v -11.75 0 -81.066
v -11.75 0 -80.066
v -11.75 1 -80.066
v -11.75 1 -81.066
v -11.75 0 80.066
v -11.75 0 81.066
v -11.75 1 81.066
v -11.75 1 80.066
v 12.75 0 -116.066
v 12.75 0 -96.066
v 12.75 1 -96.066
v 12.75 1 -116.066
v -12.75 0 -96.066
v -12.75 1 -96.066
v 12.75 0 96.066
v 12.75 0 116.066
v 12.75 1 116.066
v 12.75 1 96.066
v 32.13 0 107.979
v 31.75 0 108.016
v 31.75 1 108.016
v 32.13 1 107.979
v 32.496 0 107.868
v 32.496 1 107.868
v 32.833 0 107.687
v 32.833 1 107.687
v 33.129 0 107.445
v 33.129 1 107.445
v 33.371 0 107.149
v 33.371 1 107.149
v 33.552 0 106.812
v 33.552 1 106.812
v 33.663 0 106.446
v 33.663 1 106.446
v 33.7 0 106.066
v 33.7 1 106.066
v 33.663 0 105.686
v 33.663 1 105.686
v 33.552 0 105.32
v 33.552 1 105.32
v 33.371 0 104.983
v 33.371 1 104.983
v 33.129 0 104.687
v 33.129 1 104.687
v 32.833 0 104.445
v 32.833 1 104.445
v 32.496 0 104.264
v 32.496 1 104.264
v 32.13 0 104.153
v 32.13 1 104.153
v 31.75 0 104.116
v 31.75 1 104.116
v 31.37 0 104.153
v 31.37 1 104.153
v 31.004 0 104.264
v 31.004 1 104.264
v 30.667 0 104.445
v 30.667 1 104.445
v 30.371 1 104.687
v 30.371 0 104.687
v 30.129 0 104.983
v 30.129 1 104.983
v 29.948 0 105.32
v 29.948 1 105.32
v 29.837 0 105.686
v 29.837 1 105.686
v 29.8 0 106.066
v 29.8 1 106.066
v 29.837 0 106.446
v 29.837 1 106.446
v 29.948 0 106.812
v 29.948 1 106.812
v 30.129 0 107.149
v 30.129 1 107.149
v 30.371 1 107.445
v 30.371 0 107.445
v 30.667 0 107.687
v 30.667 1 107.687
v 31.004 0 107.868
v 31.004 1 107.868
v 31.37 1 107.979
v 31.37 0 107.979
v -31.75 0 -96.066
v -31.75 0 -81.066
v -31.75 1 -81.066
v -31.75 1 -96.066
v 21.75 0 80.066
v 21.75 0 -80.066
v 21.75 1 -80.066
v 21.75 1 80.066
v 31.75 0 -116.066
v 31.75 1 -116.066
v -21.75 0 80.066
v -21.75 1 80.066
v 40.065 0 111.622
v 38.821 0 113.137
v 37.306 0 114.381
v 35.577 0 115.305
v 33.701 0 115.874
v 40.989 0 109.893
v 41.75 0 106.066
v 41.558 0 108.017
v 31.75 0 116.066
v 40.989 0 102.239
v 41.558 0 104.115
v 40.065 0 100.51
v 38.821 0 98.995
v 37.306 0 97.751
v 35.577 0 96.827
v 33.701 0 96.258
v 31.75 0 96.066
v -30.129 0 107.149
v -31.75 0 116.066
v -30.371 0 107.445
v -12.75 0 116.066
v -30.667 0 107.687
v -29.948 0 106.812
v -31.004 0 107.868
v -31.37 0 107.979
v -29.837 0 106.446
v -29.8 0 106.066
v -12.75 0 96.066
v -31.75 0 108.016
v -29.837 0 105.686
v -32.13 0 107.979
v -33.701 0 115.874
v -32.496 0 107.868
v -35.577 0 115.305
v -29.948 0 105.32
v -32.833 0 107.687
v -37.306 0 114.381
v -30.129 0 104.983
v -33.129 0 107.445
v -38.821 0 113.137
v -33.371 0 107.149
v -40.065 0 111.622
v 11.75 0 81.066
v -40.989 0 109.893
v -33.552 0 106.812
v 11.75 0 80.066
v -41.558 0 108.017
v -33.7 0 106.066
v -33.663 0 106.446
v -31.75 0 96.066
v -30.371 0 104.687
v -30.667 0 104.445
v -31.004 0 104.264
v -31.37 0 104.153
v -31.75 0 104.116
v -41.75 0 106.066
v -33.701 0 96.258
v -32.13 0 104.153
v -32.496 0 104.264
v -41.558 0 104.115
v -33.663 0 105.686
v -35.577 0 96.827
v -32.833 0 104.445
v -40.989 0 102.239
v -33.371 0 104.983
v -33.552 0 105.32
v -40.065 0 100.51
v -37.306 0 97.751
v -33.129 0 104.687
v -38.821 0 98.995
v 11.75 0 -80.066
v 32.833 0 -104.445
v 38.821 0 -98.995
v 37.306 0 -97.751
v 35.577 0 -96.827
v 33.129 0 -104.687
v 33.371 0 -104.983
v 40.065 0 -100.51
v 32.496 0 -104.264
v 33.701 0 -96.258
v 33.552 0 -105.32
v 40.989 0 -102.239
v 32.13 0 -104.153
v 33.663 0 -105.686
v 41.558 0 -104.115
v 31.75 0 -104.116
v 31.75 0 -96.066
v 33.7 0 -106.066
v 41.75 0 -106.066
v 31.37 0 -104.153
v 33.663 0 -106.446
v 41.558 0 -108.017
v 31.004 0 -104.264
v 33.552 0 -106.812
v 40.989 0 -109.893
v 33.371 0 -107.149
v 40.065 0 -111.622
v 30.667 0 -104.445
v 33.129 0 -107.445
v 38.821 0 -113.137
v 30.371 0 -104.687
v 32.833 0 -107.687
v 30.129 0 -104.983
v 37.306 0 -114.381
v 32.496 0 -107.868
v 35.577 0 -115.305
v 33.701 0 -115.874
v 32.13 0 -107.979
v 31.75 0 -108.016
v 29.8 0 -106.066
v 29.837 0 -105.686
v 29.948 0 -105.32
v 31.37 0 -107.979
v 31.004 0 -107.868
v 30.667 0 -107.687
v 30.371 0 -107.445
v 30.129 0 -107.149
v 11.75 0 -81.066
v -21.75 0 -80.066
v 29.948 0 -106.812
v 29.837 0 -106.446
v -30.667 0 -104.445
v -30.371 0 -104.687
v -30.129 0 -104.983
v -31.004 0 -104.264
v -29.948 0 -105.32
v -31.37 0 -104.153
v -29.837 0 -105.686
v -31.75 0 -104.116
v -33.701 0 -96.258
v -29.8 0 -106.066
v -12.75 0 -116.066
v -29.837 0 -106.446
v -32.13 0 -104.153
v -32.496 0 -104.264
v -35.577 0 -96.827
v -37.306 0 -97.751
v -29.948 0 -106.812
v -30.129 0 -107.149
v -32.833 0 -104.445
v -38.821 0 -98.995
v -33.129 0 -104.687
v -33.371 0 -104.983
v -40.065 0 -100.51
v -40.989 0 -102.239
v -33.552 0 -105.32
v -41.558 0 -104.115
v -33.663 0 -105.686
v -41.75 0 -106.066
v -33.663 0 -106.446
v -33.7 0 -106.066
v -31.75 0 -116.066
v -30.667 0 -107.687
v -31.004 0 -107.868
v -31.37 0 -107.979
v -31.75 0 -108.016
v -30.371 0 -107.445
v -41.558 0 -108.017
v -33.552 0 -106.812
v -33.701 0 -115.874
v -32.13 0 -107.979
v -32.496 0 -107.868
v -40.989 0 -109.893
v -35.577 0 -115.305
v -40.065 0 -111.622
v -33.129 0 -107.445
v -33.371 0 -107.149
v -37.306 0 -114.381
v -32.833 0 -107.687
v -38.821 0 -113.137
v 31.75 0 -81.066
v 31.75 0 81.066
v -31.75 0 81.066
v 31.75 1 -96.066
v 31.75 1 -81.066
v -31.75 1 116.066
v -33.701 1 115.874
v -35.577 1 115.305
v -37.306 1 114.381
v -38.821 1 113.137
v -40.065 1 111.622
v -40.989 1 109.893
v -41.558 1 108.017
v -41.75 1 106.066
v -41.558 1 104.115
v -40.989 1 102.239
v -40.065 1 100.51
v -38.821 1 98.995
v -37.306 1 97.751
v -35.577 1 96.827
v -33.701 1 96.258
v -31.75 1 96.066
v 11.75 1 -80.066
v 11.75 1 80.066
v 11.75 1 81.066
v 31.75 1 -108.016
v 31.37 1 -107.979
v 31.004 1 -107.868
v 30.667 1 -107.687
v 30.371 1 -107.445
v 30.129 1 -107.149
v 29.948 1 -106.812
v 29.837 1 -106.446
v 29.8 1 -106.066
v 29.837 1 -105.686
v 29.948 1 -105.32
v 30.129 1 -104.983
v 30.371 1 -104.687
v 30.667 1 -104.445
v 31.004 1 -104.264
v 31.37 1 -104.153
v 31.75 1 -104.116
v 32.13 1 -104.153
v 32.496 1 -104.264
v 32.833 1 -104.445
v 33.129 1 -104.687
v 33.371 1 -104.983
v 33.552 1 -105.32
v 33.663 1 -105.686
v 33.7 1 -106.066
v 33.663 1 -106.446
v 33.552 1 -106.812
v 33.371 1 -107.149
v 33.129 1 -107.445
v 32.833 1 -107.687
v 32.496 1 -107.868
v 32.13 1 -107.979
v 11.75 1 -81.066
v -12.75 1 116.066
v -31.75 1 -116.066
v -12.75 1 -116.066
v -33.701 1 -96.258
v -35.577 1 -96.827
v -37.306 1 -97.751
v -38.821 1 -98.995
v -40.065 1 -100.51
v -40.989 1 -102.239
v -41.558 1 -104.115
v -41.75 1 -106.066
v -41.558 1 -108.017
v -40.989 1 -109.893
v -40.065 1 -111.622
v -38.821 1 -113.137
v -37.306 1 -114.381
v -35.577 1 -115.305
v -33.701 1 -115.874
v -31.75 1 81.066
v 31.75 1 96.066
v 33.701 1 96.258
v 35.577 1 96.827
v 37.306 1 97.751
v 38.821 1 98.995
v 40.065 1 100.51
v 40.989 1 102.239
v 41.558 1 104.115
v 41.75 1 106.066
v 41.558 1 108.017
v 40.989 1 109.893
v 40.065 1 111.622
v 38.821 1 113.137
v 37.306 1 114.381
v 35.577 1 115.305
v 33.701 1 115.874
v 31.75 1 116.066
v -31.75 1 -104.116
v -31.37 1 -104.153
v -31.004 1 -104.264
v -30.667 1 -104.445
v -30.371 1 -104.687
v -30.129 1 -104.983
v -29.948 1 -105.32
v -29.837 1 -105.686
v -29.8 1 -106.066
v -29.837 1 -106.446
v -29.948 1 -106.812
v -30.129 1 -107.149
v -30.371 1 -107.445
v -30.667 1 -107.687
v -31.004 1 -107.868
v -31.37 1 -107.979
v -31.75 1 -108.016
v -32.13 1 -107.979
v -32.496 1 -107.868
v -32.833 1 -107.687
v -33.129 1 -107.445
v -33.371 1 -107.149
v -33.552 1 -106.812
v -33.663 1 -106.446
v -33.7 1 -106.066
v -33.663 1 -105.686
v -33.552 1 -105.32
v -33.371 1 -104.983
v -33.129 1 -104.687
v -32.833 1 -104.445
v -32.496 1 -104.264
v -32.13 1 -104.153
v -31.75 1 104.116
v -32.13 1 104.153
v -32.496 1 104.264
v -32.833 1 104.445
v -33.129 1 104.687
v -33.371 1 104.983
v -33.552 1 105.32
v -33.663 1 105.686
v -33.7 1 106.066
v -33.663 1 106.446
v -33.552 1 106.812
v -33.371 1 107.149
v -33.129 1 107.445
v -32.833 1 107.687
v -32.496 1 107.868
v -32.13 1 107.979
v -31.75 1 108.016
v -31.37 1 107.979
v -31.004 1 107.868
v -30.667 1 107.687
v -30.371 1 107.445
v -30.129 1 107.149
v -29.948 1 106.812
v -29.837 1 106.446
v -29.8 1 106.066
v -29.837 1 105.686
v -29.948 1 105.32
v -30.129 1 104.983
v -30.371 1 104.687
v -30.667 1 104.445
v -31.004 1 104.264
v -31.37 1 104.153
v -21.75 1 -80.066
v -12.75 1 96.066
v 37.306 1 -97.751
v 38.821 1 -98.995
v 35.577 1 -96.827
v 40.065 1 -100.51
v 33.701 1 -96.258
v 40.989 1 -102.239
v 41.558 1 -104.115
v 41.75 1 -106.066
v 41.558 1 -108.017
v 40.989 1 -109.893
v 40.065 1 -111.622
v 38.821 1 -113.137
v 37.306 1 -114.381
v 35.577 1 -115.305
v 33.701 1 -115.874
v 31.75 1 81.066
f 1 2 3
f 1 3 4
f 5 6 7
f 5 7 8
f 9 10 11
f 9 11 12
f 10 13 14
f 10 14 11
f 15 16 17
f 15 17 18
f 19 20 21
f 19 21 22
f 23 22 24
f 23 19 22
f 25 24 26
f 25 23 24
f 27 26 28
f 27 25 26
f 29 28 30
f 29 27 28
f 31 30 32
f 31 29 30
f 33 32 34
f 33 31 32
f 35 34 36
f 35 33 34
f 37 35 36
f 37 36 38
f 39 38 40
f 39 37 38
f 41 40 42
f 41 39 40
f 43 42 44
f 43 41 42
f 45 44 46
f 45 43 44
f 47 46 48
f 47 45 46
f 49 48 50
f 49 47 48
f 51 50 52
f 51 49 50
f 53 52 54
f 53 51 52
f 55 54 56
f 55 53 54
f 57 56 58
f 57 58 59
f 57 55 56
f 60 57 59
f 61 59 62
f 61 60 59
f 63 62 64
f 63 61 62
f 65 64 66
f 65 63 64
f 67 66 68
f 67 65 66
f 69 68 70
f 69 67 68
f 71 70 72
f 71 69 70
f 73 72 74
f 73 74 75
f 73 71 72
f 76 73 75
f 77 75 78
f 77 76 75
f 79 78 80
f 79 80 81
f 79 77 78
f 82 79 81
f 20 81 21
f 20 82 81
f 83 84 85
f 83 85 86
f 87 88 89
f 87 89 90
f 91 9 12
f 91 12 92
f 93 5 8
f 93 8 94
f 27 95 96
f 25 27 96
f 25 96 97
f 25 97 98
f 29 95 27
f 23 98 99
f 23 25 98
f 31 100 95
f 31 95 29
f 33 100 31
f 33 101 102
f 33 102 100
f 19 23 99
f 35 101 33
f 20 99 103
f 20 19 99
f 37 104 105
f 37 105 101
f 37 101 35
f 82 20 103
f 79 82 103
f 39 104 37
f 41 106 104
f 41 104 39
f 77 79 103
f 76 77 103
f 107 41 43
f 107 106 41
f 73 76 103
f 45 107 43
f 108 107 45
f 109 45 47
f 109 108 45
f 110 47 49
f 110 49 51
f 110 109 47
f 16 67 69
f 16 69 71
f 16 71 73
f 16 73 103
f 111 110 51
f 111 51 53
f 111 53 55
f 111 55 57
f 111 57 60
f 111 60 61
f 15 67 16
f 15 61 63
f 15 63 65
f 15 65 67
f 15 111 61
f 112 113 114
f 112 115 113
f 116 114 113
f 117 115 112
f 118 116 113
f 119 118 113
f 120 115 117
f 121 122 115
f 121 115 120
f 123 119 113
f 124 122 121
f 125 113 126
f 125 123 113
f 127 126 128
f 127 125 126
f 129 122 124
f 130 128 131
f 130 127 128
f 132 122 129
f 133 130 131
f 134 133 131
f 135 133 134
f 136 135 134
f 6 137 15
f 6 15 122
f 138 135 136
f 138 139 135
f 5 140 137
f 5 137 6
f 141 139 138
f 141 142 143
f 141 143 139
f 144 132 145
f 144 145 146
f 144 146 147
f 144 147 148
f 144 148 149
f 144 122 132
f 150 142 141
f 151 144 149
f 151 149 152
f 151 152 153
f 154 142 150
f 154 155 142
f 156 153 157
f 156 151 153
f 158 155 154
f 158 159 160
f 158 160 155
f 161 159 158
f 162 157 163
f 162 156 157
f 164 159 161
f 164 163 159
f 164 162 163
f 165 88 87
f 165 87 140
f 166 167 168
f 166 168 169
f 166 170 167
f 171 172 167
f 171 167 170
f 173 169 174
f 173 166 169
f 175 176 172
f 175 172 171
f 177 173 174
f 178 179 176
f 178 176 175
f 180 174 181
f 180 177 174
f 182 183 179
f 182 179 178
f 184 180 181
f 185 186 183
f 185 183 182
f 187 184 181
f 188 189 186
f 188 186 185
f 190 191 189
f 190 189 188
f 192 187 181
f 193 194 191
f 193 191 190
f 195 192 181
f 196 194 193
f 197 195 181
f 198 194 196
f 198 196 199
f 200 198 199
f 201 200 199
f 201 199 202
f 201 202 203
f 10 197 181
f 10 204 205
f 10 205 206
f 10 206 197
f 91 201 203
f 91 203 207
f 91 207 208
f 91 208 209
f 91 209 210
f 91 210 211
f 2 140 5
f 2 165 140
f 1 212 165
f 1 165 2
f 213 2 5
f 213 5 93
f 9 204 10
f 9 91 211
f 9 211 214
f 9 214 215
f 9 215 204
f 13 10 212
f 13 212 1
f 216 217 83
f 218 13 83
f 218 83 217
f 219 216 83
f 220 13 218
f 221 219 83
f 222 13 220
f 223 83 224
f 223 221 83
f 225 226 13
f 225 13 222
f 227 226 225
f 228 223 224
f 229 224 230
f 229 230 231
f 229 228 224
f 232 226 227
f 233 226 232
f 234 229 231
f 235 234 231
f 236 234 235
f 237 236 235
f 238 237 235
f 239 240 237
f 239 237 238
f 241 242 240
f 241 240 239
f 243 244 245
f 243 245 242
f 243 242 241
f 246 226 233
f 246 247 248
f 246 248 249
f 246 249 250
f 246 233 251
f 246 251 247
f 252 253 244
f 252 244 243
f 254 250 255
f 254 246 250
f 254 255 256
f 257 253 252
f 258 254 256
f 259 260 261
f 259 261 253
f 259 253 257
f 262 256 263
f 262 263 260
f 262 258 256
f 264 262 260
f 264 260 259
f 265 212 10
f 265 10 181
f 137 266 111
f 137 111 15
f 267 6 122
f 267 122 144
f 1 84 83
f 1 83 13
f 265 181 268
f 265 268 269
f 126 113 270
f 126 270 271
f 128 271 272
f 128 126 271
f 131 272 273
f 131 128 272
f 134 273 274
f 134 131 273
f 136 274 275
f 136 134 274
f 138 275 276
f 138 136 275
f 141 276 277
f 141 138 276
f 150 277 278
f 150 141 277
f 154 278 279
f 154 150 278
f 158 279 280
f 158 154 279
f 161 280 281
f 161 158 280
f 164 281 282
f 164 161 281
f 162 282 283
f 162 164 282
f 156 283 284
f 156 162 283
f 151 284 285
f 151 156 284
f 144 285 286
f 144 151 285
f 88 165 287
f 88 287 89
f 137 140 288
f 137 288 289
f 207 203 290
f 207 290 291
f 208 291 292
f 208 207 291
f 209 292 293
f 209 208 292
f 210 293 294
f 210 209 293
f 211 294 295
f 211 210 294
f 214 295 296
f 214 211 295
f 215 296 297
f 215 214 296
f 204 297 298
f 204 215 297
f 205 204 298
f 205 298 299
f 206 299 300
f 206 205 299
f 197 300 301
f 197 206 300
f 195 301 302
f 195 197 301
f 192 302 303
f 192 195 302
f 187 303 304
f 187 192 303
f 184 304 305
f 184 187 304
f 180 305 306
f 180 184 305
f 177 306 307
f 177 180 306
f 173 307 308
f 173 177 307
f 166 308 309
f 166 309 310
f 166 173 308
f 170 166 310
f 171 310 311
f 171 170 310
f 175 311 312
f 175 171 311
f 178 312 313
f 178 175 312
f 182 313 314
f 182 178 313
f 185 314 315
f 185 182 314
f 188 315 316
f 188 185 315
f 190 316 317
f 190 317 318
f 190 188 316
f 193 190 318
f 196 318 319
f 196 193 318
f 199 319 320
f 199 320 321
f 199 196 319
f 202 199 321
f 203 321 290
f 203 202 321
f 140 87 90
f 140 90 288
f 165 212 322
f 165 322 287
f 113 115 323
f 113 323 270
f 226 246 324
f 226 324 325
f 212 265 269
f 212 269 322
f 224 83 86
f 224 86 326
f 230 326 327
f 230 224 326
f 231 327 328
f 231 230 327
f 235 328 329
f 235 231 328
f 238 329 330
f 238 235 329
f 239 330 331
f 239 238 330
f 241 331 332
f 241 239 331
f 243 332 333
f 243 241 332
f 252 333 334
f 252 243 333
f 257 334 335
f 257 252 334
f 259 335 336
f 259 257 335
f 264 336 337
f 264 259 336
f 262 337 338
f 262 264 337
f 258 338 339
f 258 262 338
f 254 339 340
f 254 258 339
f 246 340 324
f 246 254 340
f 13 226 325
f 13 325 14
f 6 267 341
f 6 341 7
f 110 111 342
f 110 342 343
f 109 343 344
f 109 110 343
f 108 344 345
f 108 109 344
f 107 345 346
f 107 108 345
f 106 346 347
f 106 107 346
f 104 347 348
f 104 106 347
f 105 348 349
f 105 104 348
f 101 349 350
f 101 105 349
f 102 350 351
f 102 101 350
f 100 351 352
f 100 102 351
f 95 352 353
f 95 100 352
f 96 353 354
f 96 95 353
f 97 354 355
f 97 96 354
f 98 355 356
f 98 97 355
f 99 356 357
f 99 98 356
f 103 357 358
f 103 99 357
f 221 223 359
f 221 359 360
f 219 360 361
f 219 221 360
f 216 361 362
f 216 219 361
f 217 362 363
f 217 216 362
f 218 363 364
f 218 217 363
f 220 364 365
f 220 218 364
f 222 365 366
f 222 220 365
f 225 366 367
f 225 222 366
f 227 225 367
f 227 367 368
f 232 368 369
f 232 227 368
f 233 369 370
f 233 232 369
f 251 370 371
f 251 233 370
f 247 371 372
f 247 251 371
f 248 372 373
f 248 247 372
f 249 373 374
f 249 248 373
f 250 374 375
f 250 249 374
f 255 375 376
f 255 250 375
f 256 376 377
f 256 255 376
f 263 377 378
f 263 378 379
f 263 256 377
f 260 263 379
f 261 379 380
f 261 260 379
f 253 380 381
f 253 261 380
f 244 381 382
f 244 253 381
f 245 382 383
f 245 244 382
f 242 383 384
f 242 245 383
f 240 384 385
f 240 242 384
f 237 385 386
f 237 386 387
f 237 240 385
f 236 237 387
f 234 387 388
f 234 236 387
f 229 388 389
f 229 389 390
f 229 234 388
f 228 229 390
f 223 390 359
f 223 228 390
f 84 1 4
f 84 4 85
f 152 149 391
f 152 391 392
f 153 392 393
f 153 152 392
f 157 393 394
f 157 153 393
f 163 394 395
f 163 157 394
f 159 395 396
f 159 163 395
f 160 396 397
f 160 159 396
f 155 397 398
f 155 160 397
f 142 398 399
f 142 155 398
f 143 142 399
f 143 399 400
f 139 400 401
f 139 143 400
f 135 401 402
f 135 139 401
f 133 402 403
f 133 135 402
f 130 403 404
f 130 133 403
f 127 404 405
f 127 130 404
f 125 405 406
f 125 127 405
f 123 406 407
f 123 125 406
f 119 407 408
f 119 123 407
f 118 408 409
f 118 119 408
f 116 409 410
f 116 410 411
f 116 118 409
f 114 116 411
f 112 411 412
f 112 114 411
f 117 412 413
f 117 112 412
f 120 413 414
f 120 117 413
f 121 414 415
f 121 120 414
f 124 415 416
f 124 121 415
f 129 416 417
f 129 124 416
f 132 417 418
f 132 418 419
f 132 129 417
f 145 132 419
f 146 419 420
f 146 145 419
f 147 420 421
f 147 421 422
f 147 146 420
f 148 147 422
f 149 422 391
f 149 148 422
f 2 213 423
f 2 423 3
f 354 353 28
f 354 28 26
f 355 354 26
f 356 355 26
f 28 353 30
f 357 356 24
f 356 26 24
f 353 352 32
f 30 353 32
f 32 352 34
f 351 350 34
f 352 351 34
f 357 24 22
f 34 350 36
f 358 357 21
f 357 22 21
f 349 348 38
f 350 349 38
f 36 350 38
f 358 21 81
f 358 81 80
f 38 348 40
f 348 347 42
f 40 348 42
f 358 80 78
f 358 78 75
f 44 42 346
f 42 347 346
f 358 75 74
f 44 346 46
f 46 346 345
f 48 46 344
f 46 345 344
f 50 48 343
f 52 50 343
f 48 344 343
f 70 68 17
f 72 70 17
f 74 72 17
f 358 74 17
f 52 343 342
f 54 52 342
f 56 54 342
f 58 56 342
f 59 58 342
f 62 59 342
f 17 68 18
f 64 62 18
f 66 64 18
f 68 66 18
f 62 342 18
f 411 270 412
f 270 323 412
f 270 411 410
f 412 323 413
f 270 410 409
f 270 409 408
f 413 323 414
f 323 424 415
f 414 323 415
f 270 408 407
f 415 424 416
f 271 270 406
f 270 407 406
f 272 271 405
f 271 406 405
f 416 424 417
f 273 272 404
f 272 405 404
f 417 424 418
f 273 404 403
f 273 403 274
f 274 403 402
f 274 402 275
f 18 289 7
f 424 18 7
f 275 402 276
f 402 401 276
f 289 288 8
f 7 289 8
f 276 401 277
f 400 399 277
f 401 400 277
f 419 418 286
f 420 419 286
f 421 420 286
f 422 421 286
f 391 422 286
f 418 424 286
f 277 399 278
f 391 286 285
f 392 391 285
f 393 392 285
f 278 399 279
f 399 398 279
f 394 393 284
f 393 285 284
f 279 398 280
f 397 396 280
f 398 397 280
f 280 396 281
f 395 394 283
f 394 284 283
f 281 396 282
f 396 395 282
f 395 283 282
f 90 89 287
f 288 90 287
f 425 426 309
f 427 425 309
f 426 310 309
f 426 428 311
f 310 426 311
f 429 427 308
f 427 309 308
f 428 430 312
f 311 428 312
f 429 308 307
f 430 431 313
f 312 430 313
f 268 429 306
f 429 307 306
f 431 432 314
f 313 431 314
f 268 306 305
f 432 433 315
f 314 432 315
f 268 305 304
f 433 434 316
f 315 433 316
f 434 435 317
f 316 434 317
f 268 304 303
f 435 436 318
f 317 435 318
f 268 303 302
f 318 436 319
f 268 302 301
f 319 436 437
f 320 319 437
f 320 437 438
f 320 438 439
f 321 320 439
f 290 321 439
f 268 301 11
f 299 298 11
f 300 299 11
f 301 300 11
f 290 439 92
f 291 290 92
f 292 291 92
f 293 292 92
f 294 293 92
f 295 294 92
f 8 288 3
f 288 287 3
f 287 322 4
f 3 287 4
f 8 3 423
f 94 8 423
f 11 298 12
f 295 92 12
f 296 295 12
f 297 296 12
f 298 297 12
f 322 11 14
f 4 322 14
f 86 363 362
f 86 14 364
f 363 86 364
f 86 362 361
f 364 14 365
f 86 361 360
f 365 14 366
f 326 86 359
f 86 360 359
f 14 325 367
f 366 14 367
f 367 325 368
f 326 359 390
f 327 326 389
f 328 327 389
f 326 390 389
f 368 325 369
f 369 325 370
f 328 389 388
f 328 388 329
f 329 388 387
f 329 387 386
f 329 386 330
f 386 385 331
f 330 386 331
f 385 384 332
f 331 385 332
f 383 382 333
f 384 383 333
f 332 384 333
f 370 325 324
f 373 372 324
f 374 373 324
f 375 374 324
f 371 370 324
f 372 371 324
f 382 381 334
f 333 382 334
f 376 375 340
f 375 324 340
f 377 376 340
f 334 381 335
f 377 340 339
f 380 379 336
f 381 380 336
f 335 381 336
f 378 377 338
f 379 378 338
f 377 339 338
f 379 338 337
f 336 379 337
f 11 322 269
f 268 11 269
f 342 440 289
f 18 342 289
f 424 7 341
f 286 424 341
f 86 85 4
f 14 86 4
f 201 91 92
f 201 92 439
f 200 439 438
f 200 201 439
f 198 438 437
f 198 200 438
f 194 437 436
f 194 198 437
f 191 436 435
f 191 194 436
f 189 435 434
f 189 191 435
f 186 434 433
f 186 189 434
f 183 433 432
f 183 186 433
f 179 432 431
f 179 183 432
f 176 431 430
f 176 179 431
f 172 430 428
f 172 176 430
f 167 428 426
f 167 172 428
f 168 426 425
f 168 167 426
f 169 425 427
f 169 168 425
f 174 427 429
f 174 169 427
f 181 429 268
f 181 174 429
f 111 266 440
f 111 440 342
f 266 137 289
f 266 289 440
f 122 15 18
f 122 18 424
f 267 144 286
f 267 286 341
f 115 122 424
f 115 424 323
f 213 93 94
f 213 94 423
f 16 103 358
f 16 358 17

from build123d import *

# Parameters (mm, degrees)
SKETCH1_R           = 1.95
BOSS_EXTRUDE1_DEPTH = 1


with BuildPart() as part:
    # Sketch1 → Boss-Extrude1 (new body)
    with BuildSketch(Plane(origin=(0, 0, 0), x_dir=(1, 0, 0), z_dir=(0, 1, 0))):
        with BuildLine():
            Line((-31.75, 116.06601718), (-12.75, 116.06601718))
            Line((-12.75, 116.06601718), (-12.75, 96.06601718))
            Line((-12.75, 96.06601718), (-11.75, 96.06601718))
            Line((-11.75, 96.06601718), (11.75, 96.06601718))
            Line((11.75, 96.06601718), (12.75, 96.06601718))
            Line((12.75, 96.06601718), (12.75, 116.06601718))
            Line((12.75, 116.06601718), (31.75, 116.06601718))
            ThreePointArc((31.75, 116.06601718), (41.75, 106.06601718), (31.75, 96.06601718))
            Line((31.75, 96.06601718), (31.75, 81.06601718))
            Line((31.75, 81.06601718), (11.75, 81.06601718))
            Line((11.75, 81.06601718), (11.75, 80.06601718))
            Line((11.75, 80.06601718), (21.75, 80.06601718))
            Line((21.75, 80.06601718), (21.75, -80.06601718))
            Line((21.75, -80.06601718), (11.75, -80.06601718))
            Line((11.75, -80.06601718), (11.75, -81.06601718))
            Line((11.75, -81.06601718), (31.75, -81.06601718))
            Line((31.75, -81.06601718), (31.75, -96.06601718))
            ThreePointArc((31.75, -96.06601718), (41.75, -106.06601718), (31.75, -116.06601718))
            Line((31.75, -116.06601718), (12.75, -116.06601718))
            Line((12.75, -116.06601718), (12.75, -96.06601718))
            Line((12.75, -96.06601718), (11.75, -96.06601718))
            Line((11.75, -96.06601718), (-11.75, -96.06601718))
            Line((-11.75, -96.06601718), (-12.75, -96.06601718))
            Line((-12.75, -96.06601718), (-12.75, -116.06601718))
            Line((-12.75, -116.06601718), (-31.75, -116.06601718))
            ThreePointArc((-31.75, -116.06601718), (-41.75, -106.06601718), (-31.75, -96.06601718))
            Line((-31.75, -96.06601718), (-31.75, -81.06601718))
            Line((-31.75, -81.06601718), (-11.75, -81.06601718))
            Line((-11.75, -81.06601718), (-11.75, -80.06601718))
            Line((-11.75, -80.06601718), (-21.75, -80.06601718))
            Line((-21.75, -80.06601718), (-21.75, 80.06601718))
            Line((-21.75, 80.06601718), (-11.75, 80.06601718))
            Line((-11.75, 80.06601718), (-11.75, 81.06601718))
            Line((-11.75, 81.06601718), (-31.75, 81.06601718))
            Line((-31.75, 81.06601718), (-31.75, 96.06601718))
            ThreePointArc((-31.75, 96.06601718), (-41.75, 106.06601718), (-31.75, 116.06601718))
        make_face()
        with Locations(Location((-31.75, 106.06601718, 0), (0, 0, 270))):
            Circle(SKETCH1_R, mode=Mode.SUBTRACT)
        with Locations(Location((31.75, 106.06601718, 0), (0, 0, 90))):
            Circle(SKETCH1_R, mode=Mode.SUBTRACT)
        with Locations(Location((31.75, -106.06601718, 0), (0, 0, 270))):
            Circle(SKETCH1_R, mode=Mode.SUBTRACT)
        with Locations(Location((-31.75, -106.06601718, 0), (0, 0, 90))):
            Circle(SKETCH1_R, mode=Mode.SUBTRACT)
    extrude(amount=BOSS_EXTRUDE1_DEPTH)


solid = part.part
